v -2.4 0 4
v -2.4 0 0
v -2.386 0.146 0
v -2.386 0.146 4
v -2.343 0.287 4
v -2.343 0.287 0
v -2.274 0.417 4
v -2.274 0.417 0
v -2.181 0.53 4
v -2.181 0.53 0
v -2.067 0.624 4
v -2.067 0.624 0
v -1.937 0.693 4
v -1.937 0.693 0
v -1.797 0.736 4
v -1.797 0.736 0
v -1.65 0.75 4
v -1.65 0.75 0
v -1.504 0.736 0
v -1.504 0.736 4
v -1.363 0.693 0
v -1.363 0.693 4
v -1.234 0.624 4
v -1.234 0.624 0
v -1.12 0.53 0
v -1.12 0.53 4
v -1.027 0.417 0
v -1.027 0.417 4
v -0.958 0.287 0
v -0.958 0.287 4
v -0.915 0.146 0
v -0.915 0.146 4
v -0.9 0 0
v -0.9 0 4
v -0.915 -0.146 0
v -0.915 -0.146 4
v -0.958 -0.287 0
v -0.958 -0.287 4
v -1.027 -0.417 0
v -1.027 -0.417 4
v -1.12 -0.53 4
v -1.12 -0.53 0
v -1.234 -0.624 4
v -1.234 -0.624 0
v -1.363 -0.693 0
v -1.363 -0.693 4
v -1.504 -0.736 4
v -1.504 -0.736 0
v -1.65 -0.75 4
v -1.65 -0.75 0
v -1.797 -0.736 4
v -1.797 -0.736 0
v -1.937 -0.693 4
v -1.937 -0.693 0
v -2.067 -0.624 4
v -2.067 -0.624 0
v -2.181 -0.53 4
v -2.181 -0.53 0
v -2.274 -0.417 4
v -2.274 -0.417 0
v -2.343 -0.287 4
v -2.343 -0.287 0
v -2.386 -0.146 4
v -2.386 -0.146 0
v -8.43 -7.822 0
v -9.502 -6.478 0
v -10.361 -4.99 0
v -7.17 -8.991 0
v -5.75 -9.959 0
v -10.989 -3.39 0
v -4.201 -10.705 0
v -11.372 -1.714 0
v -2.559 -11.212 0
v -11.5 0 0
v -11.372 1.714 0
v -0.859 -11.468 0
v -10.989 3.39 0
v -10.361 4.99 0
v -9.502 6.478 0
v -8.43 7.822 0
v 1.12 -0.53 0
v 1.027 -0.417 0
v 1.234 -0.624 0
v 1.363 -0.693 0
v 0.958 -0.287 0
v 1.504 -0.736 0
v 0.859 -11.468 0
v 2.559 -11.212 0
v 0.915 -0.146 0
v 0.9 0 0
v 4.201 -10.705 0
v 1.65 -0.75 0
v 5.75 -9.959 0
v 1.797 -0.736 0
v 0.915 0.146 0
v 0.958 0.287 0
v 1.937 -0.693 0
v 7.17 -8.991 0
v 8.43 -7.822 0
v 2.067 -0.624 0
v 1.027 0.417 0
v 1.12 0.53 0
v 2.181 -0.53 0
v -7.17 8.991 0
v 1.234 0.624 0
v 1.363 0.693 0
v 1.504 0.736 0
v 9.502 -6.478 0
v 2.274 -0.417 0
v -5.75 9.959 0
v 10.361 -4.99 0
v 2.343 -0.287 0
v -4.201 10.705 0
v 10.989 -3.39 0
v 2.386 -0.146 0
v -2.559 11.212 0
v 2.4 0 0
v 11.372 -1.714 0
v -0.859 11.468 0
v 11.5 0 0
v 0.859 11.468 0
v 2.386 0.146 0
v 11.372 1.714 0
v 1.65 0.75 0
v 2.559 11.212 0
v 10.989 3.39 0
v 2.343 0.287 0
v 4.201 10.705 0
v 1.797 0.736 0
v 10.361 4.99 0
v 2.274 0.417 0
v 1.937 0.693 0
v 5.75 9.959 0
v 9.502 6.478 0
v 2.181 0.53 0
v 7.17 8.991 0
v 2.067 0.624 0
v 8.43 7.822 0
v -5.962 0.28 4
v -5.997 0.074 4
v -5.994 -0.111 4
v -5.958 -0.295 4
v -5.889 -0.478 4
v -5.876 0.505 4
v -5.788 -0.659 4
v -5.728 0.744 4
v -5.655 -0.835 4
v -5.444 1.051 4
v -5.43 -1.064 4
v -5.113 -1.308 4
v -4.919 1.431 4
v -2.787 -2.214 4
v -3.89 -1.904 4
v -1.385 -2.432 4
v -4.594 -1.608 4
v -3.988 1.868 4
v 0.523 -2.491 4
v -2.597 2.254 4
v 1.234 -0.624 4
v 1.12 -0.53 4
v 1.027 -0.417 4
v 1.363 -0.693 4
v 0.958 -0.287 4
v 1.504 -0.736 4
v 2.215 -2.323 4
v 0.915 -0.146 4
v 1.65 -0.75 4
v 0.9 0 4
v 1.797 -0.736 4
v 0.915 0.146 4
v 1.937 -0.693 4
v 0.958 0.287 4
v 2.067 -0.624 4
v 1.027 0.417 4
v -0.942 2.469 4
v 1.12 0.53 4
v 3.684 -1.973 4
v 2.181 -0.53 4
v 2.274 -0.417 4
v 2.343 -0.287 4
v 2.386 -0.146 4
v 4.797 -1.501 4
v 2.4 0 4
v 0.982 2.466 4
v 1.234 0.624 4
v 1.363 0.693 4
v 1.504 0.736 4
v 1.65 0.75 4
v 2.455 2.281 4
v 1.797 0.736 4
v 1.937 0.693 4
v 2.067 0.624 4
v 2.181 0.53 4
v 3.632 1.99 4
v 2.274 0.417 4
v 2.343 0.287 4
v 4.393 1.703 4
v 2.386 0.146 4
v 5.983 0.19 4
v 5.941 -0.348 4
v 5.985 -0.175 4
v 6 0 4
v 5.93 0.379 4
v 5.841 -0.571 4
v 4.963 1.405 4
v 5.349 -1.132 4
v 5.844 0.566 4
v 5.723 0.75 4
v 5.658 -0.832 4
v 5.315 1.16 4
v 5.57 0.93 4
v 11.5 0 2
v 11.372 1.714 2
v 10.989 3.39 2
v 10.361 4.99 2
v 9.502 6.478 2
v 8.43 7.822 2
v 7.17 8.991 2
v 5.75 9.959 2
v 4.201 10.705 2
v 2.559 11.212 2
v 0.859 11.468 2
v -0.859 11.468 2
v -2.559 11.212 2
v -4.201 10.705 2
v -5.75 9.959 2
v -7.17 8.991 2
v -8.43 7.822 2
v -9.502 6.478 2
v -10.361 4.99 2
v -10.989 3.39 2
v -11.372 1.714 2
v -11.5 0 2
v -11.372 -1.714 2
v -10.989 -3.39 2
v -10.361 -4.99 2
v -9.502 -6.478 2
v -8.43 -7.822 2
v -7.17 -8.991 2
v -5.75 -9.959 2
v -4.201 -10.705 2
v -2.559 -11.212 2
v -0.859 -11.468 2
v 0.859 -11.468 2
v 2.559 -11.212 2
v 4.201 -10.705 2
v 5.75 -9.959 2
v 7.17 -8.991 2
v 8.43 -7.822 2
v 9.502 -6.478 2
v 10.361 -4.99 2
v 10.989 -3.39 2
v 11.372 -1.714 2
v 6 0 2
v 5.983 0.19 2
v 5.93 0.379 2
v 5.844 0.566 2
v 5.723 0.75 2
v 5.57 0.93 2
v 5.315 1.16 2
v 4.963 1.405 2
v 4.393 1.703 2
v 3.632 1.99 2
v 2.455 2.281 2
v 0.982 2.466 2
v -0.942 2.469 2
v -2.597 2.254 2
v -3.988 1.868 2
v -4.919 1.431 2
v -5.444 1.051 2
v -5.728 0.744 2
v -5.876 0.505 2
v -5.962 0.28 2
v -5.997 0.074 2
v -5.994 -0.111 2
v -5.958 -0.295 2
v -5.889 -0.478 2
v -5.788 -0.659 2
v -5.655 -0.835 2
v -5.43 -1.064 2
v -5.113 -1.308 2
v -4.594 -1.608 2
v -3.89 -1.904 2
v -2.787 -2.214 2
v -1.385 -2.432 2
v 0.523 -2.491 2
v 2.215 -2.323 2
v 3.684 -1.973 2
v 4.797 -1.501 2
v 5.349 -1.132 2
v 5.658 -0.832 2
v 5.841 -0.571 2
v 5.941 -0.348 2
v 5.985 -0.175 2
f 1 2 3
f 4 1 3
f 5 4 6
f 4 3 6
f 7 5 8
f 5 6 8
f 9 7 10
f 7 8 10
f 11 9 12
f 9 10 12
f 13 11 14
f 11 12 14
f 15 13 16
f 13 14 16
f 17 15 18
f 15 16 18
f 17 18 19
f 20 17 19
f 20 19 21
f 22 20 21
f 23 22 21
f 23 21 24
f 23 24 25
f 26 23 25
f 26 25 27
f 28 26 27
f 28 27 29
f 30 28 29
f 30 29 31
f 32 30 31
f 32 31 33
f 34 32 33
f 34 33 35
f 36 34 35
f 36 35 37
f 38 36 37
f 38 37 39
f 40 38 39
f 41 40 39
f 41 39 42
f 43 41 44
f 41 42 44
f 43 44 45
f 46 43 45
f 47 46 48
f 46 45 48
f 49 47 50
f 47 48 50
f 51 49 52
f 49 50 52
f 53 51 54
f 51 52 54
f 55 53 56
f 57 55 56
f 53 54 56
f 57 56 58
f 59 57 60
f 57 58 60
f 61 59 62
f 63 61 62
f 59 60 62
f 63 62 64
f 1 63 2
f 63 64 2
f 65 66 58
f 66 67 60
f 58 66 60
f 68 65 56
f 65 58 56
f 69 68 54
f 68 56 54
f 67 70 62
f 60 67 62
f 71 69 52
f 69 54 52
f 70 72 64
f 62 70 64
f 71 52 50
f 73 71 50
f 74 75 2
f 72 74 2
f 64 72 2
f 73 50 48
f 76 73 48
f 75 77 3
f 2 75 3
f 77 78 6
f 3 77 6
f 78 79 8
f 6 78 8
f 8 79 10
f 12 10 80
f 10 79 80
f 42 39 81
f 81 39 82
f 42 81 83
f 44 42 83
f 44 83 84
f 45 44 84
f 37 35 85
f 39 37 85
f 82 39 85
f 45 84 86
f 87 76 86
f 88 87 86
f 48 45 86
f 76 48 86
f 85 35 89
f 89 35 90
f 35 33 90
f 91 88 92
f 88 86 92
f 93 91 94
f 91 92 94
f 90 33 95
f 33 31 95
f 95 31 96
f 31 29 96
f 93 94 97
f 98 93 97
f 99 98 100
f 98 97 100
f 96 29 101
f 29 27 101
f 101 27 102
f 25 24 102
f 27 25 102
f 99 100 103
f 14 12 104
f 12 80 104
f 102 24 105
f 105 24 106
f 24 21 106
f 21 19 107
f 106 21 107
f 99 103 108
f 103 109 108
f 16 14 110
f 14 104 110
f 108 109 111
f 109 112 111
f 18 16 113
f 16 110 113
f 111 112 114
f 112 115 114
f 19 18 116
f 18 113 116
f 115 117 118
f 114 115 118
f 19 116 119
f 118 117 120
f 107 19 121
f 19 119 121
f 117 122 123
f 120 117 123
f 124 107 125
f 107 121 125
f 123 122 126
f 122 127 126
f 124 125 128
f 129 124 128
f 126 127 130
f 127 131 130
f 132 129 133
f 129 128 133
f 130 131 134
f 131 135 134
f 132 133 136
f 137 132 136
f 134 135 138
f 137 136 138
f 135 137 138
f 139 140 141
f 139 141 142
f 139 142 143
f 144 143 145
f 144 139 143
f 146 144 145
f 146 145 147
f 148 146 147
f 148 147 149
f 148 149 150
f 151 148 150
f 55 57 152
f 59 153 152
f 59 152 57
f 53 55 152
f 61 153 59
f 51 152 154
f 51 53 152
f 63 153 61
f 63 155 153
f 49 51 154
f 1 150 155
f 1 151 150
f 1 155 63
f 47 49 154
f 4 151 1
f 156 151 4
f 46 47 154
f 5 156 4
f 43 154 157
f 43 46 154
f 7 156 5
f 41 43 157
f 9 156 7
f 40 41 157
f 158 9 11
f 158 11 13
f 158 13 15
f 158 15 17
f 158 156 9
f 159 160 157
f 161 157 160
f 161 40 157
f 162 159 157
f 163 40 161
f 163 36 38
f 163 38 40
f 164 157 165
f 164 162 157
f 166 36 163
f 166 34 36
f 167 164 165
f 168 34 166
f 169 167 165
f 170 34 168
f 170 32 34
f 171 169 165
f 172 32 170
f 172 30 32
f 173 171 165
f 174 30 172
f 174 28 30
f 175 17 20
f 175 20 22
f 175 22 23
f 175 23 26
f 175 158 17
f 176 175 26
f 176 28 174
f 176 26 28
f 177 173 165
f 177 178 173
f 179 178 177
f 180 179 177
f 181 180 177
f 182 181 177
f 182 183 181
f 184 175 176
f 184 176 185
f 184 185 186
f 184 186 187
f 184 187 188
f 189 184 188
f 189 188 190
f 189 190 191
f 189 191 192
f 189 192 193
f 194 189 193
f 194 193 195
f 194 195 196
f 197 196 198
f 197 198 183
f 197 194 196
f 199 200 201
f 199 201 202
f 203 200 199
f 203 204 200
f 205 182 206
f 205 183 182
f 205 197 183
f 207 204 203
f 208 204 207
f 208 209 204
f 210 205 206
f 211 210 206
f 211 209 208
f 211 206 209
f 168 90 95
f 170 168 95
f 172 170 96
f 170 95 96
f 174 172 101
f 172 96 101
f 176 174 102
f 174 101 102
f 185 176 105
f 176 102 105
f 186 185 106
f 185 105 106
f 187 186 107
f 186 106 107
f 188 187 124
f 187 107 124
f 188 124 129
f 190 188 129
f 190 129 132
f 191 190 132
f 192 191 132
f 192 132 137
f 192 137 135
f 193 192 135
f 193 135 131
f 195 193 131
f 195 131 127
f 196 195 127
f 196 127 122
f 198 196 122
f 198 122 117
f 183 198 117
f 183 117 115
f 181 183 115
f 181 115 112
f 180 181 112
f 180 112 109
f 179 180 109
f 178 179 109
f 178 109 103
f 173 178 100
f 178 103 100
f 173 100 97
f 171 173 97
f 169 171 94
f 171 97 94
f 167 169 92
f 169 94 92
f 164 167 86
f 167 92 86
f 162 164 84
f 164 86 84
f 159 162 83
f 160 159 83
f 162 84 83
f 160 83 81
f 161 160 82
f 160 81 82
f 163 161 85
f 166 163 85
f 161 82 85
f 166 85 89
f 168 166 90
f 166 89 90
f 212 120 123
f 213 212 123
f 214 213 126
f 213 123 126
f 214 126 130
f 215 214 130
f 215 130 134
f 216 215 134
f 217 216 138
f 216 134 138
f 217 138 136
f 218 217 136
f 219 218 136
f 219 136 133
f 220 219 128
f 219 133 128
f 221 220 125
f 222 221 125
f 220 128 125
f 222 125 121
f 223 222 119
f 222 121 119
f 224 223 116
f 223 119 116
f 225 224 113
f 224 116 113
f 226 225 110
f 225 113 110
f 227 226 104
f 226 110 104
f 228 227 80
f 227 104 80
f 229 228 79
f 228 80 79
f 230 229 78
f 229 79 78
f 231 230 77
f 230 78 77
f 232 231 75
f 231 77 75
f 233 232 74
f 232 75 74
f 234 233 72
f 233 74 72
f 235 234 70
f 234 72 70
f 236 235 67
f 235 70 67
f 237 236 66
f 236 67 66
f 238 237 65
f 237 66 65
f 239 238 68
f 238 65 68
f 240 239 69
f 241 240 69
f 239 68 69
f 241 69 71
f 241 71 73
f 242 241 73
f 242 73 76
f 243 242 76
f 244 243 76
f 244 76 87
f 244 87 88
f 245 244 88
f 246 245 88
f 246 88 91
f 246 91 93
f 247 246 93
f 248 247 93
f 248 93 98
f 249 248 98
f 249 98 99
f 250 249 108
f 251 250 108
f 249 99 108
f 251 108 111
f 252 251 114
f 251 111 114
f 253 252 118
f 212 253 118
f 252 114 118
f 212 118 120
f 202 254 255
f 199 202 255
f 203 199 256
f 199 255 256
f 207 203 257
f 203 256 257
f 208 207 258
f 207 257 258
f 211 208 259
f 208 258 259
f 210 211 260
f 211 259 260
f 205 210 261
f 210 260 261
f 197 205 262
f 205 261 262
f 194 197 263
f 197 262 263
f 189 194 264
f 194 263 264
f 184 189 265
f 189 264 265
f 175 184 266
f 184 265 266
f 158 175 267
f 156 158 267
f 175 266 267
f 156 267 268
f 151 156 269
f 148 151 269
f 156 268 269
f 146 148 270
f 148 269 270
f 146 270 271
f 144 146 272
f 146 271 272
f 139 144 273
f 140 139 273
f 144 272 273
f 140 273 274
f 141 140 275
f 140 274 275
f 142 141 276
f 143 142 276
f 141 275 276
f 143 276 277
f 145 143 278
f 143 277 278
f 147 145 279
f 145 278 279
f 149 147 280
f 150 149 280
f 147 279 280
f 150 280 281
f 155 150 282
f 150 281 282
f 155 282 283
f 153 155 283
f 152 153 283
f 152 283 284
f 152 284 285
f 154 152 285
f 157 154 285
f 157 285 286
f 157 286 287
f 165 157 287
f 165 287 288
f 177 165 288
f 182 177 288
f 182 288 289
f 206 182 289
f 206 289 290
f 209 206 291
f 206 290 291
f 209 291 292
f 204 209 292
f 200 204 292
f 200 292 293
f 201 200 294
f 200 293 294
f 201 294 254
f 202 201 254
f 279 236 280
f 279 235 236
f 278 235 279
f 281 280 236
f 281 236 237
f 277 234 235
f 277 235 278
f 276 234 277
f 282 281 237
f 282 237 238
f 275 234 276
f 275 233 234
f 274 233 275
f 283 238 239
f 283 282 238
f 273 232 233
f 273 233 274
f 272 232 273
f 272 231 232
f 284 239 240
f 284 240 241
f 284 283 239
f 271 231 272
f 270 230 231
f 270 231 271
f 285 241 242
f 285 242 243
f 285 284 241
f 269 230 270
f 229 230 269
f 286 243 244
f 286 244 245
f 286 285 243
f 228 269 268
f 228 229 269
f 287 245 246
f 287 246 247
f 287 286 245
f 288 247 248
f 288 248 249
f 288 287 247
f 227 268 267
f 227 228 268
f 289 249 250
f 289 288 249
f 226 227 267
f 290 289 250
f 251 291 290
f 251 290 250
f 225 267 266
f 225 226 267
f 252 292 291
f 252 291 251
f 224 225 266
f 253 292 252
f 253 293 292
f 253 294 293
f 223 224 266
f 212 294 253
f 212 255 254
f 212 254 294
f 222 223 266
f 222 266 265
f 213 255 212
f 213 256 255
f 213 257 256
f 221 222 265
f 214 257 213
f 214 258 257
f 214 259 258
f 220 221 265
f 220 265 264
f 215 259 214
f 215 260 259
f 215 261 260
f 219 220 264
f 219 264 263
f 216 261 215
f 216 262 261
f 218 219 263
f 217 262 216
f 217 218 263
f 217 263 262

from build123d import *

# Parameters (mm, degrees)
ESQUISSE1_R             = 11.5
BOSS_EXTRU_1_DEPTH      = 2
ESQUISSE6_RX            = 6
ESQUISSE6_RY            = 2.5
BOSS_EXTRU_5_DEPTH      = 2
ESQUISSE7_R             = 0.75
ENL_V_MAT_EXTRU_1_DEPTH = 17.748134224


with BuildPart() as part:
    # Esquisse1 → Boss.-Extru.1 (new body)
    with BuildSketch(Plane.XY):
        Circle(ESQUISSE1_R)
    extrude(amount=BOSS_EXTRU_1_DEPTH)

    # Esquisse6 → Boss.-Extru.5 (add)
    with BuildSketch(Plane.XY.offset(2)):
        with Locations((0, 0)):
            Ellipse(ESQUISSE6_RX, ESQUISSE6_RY)
    extrude(amount=BOSS_EXTRU_5_DEPTH)

    # Esquisse7 → Enlèv. mat.-Extru.1 (cut, through all)
    with BuildSketch(Plane(origin=(0, 0, 0), x_dir=(-1, 0, 0), z_dir=(0, 0, -1))):
        with Locations((1.650464666, 0)):
            Circle(ESQUISSE7_R)
        with Locations((-1.650464666, 0)):
            Circle(ESQUISSE7_R)
    extrude(amount=-ENL_V_MAT_EXTRU_1_DEPTH, mode=Mode.SUBTRACT)


solid = part.part
